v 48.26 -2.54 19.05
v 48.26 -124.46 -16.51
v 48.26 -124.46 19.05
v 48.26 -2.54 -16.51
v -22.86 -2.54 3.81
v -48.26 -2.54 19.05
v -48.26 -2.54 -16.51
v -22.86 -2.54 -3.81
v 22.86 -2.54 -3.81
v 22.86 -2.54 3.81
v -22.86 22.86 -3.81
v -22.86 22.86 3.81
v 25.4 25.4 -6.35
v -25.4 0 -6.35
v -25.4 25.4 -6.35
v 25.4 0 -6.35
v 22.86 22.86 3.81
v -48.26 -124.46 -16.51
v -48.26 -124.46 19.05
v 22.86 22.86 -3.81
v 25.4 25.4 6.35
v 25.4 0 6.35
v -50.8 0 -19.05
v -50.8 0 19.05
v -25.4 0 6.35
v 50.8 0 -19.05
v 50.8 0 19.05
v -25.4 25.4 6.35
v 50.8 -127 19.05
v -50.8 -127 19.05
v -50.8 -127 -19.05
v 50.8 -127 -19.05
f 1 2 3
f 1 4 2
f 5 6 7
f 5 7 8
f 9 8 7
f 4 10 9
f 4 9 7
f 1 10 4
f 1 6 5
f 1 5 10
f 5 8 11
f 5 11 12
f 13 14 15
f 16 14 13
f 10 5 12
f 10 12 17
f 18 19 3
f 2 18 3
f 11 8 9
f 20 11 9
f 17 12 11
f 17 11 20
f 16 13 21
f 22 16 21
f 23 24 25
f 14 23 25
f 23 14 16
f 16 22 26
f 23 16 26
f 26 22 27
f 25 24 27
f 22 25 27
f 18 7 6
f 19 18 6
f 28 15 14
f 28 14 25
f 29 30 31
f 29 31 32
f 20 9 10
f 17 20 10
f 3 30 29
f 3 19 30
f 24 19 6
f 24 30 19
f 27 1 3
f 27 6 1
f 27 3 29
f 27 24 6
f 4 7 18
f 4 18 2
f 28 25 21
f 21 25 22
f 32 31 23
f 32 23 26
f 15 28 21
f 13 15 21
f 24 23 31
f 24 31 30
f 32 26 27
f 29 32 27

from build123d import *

# Parameters (mm, degrees)
F0_W      = 101.6
F0_H      = 38.1
F1_DEPTH  = 127
F2_W      = 50.8
F2_H      = 12.7
F1_FACE_W = 101.6
F1_FACE_H = 38.1
F3_DEPTH  = 25.4
F4_T      = -2.54


with BuildPart() as f1:
    # F0 (on Front) → F1 (new body)
    with BuildSketch(Plane.XZ):
        Rectangle(F0_W, F0_H)
    extrude(amount=F1_DEPTH)

    # F2 (on Front) + F1_face (on face) → F3 (join)
    with BuildSketch(Plane.XZ):
        Rectangle(F2_W, F2_H)
    with BuildSketch(Plane.XZ.offset(127)):
        Rectangle(F1_FACE_W, F1_FACE_H)
    extrude(amount=-F3_DEPTH)

    # F4
    f4_openings = [f1.faces().sort_by_distance(p)[0] for p in [
        (0, -63.5, 19.05),
    ]]
    offset(amount=F4_T, openings=f4_openings, kind=Kind.INTERSECTION)


solid = f1.part
